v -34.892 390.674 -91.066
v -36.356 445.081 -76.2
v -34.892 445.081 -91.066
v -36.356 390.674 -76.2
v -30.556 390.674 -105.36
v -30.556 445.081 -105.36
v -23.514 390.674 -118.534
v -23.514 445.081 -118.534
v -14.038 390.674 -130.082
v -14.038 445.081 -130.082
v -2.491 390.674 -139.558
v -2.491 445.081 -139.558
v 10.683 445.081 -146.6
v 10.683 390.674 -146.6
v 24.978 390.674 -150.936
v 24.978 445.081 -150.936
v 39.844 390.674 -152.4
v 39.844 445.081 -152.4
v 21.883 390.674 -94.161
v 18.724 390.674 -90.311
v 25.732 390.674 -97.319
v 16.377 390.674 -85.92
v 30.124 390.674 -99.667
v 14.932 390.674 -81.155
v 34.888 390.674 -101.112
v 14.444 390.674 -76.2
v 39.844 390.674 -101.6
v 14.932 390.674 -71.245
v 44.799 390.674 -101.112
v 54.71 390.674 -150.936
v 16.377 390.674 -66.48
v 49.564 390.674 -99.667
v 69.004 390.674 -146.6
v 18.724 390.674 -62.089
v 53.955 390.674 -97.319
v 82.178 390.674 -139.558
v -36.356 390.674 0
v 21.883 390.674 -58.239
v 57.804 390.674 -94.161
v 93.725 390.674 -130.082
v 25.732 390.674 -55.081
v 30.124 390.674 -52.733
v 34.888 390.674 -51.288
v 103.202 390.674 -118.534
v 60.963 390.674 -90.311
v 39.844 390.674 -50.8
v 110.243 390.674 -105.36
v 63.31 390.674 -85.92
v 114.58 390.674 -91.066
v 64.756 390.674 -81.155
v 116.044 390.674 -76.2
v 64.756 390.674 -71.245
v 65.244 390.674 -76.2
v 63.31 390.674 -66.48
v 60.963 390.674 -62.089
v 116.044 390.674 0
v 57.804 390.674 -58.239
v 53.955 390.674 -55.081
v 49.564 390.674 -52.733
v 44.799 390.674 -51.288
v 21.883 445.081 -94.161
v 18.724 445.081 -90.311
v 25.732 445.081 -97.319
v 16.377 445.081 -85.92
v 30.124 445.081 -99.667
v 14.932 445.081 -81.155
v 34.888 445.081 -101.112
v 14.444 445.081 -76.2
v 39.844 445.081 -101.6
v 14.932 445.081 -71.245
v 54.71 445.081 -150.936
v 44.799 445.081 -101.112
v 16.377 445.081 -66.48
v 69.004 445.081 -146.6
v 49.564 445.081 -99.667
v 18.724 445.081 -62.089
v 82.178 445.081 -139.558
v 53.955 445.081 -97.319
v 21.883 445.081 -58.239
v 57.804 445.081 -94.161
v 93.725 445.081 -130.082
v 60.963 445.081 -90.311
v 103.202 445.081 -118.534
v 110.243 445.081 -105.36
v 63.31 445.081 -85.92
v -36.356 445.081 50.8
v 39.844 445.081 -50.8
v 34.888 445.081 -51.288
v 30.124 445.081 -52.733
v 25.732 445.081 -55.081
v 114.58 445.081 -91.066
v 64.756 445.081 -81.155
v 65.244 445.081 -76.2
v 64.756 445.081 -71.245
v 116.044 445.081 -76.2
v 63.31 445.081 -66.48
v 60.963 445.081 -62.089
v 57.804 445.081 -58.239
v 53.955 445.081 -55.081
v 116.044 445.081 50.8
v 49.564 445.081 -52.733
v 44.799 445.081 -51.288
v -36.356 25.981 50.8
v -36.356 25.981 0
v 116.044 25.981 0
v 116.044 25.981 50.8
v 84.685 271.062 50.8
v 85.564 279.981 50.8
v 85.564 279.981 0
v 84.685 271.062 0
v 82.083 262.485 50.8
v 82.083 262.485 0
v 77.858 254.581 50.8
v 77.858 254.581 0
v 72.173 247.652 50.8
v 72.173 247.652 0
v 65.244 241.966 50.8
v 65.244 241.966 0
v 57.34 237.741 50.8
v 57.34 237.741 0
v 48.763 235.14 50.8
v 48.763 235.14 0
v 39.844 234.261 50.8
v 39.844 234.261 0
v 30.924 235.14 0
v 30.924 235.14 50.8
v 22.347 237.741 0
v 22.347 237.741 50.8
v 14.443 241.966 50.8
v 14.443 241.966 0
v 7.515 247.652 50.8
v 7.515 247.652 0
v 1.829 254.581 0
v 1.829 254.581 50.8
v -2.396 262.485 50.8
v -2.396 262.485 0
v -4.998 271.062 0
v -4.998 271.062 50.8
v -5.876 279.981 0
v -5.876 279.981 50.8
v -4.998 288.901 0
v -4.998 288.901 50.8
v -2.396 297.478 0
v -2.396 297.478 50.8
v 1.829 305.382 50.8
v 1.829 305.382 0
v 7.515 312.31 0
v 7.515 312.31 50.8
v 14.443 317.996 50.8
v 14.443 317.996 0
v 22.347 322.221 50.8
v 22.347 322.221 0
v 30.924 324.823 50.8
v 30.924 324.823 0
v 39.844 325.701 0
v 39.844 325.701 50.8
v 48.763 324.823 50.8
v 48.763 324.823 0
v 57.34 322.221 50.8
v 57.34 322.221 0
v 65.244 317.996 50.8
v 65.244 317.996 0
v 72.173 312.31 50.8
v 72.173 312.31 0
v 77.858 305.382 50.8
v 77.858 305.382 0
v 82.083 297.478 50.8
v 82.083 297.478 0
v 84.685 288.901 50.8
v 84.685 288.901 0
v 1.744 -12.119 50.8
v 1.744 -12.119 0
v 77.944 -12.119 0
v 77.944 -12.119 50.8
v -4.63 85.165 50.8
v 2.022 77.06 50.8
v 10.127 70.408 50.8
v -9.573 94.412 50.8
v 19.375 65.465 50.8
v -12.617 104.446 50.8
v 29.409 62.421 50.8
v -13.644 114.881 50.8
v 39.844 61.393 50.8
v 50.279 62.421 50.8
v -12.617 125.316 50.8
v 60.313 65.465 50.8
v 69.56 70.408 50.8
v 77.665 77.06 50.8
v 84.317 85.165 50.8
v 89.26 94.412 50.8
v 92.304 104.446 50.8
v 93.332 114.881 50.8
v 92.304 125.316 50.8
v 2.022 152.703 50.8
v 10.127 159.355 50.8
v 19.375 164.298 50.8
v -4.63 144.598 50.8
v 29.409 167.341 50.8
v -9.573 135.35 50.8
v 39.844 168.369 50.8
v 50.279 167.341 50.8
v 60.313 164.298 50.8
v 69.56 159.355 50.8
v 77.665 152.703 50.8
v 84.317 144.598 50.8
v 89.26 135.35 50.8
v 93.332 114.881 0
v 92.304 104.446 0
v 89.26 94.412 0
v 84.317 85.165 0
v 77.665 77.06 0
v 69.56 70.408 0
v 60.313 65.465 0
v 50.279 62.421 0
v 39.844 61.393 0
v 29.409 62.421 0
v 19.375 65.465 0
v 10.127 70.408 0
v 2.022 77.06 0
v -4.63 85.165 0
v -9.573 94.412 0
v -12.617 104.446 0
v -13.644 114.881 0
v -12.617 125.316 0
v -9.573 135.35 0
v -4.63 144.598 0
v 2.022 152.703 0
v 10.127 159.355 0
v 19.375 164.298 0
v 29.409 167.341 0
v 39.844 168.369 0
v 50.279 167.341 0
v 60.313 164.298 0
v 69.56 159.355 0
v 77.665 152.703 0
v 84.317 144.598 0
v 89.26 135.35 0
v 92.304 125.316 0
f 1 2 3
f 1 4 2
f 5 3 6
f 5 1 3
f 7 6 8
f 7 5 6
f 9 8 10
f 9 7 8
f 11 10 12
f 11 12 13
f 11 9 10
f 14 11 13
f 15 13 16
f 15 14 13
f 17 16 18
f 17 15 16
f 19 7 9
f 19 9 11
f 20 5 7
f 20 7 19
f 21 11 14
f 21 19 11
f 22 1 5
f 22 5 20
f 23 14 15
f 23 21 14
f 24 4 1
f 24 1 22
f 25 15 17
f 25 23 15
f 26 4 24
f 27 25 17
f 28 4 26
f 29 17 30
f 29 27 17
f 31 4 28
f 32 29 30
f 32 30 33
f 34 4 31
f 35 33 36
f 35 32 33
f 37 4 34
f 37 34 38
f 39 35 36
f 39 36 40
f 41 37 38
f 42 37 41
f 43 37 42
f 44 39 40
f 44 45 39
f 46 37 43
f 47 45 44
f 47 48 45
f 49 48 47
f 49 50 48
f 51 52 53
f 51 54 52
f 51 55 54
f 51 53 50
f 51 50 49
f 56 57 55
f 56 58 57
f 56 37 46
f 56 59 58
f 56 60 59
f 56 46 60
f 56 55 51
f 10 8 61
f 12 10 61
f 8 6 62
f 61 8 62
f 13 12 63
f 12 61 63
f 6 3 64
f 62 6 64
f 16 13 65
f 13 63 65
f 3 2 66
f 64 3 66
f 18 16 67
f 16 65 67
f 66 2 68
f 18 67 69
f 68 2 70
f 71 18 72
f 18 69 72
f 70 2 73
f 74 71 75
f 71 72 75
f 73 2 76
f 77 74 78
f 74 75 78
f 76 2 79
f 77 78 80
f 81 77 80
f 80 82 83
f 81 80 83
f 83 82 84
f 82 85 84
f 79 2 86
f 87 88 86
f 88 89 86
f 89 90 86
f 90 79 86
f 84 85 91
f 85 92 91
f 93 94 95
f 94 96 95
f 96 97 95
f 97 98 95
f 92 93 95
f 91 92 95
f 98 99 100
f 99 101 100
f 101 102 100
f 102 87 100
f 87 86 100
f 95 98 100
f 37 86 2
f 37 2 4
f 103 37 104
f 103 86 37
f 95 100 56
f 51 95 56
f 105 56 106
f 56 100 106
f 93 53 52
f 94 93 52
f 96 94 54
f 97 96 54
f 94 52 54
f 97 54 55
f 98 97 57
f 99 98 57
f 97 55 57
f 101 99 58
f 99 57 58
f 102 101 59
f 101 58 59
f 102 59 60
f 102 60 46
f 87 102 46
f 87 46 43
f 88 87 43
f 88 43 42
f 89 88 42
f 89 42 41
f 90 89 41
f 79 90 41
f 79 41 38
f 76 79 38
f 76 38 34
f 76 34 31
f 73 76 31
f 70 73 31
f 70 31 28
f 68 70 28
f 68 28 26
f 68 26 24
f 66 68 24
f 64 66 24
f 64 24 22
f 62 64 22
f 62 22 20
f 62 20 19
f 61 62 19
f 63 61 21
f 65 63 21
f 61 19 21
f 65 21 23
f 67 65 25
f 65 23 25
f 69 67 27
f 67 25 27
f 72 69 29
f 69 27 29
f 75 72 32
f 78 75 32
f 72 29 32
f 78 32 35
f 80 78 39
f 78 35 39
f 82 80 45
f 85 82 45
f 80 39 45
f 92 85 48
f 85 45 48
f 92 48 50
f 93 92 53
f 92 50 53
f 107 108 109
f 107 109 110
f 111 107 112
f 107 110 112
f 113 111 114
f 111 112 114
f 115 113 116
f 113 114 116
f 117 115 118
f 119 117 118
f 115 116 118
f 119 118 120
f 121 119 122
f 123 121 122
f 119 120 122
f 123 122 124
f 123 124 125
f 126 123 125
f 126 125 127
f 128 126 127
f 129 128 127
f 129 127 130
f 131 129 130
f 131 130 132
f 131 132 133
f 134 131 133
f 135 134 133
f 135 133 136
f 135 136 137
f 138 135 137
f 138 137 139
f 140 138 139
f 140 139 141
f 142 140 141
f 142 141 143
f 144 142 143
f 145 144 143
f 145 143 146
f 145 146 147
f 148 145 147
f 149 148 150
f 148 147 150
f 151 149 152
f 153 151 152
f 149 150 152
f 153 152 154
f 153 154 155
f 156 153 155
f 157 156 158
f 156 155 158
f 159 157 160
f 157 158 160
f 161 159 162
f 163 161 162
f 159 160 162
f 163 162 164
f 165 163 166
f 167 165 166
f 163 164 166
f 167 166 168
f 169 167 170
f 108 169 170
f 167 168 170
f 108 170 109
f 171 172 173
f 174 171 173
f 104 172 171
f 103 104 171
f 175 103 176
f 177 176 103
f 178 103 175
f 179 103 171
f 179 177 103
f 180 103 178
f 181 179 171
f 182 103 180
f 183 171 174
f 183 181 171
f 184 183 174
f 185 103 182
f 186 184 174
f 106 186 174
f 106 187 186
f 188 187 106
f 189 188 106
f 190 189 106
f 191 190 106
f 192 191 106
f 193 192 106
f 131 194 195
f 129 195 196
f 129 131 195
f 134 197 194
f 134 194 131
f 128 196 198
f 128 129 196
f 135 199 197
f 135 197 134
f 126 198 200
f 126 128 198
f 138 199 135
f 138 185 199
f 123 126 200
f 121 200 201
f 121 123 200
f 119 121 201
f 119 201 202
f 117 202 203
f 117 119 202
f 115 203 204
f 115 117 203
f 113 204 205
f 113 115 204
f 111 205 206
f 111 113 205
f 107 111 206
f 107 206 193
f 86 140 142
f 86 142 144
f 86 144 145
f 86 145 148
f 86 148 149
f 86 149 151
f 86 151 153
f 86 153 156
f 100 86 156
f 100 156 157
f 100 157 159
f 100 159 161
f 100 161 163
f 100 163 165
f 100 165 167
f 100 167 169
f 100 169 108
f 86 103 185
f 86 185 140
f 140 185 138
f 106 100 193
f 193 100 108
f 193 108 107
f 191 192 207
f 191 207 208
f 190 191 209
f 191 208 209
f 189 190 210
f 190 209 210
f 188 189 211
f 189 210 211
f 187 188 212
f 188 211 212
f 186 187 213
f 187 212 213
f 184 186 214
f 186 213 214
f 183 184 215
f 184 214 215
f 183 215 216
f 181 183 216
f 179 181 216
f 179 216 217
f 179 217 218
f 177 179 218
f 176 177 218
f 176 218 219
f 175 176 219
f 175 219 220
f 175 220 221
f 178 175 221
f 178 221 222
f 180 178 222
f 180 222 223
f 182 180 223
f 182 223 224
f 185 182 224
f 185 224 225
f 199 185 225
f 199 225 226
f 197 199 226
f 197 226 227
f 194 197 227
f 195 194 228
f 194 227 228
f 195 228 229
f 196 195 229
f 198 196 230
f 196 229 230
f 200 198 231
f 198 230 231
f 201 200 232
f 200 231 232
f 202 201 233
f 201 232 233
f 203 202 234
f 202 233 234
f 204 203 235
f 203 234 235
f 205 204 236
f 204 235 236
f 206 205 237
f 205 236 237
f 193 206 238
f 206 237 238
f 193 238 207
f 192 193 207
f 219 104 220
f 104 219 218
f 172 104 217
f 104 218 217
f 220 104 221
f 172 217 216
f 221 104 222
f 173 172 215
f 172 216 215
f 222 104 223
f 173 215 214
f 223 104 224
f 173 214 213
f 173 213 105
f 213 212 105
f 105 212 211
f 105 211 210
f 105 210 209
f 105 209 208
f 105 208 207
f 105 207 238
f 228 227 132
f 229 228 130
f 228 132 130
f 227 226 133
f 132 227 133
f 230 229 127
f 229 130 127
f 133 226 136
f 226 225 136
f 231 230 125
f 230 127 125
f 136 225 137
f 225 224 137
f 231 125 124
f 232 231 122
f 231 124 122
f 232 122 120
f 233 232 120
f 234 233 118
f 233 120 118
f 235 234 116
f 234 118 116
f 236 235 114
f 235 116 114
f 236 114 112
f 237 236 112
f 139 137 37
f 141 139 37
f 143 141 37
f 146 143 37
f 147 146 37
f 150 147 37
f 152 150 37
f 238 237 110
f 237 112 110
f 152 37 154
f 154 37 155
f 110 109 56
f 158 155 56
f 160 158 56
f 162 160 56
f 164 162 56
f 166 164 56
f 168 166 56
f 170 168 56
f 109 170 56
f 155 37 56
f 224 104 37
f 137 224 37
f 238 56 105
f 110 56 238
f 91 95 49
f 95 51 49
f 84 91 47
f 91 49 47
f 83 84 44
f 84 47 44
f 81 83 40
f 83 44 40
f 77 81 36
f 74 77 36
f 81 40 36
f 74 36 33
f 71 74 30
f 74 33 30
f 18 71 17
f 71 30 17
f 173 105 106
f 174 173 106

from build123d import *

# Parameters (mm, degrees)
F0_W     = 152.4
F0_H     = 457.2
F1_DEPTH = 50.8
F2_W     = 152.4
F2_H     = 54.4068123519
F3_DEPTH = 152.4
F4_R     = 76.19999
F5_R     = 45.72
F5_R_2   = 53.4879372825
F6_DEPTH = 50.801
F7_R     = 25.4
F8_DEPTH = 54.4078123519
F9_SIZE  = 38.1


# Not quite as in the source:
# - a fillet or chamfer is up to 0.001 mm smaller than in the source, because OpenCascade refuses the exact size


with BuildPart() as f1:
    # F0 (on Top) → F1 (new body)
    with BuildSketch(Plane.XY):
        with Locations((39.8436626315, 216.4812246025)):
            Rectangle(F0_W, F0_H)
    extrude(amount=F1_DEPTH)

    # F2 (on face) → F3 (join)
    with BuildSketch(Plane(origin=(0, 0, 0), x_dir=(1, 0, 0), z_dir=(0, 0, -1))):
        with Locations((39.8436626315, -417.8778184265)):
            Rectangle(F2_W, F2_H)
    extrude(amount=F3_DEPTH)

    # F4 (radius 76.2 in the source; OpenCascade refuses exactly that, so slightly less here)
    f4_edges = [f1.edges().sort_by_distance(p)[0] for p in [
        (116.043663, 417.877818, -152.4),
        (-36.356337, 417.877818, -152.4),
    ]]
    fillet(f4_edges, radius=F4_R)

    # F5 (on face) → F6 (cut, through all)
    with BuildSketch(Plane(origin=(0, 0, 0), x_dir=(1, 0, 0), z_dir=(0, 0, -1))):
        with Locations((39.8436626315, -279.9812246025)):
            Circle(F5_R)
        with Locations((39.8436626315, -114.8812246025)):
            Circle(F5_R_2)
    extrude(amount=-F6_DEPTH, mode=Mode.SUBTRACT)

    # F7 (on face) → F8 (cut, through all)
    with BuildSketch(Plane.XZ.offset(-390.6744122505)):
        with Locations((39.8436626315, -76.2)):
            Circle(F7_R)
    extrude(amount=-F8_DEPTH, mode=Mode.SUBTRACT)

    # F9
    f9_edges = [f1.edges().sort_by_distance(p)[0] for p in [
        (116.043663, -12.118775, 25.4),
        (-36.356337, -12.118775, 25.4),
    ]]
    chamfer(f9_edges, length=F9_SIZE)


solid = f1.part
